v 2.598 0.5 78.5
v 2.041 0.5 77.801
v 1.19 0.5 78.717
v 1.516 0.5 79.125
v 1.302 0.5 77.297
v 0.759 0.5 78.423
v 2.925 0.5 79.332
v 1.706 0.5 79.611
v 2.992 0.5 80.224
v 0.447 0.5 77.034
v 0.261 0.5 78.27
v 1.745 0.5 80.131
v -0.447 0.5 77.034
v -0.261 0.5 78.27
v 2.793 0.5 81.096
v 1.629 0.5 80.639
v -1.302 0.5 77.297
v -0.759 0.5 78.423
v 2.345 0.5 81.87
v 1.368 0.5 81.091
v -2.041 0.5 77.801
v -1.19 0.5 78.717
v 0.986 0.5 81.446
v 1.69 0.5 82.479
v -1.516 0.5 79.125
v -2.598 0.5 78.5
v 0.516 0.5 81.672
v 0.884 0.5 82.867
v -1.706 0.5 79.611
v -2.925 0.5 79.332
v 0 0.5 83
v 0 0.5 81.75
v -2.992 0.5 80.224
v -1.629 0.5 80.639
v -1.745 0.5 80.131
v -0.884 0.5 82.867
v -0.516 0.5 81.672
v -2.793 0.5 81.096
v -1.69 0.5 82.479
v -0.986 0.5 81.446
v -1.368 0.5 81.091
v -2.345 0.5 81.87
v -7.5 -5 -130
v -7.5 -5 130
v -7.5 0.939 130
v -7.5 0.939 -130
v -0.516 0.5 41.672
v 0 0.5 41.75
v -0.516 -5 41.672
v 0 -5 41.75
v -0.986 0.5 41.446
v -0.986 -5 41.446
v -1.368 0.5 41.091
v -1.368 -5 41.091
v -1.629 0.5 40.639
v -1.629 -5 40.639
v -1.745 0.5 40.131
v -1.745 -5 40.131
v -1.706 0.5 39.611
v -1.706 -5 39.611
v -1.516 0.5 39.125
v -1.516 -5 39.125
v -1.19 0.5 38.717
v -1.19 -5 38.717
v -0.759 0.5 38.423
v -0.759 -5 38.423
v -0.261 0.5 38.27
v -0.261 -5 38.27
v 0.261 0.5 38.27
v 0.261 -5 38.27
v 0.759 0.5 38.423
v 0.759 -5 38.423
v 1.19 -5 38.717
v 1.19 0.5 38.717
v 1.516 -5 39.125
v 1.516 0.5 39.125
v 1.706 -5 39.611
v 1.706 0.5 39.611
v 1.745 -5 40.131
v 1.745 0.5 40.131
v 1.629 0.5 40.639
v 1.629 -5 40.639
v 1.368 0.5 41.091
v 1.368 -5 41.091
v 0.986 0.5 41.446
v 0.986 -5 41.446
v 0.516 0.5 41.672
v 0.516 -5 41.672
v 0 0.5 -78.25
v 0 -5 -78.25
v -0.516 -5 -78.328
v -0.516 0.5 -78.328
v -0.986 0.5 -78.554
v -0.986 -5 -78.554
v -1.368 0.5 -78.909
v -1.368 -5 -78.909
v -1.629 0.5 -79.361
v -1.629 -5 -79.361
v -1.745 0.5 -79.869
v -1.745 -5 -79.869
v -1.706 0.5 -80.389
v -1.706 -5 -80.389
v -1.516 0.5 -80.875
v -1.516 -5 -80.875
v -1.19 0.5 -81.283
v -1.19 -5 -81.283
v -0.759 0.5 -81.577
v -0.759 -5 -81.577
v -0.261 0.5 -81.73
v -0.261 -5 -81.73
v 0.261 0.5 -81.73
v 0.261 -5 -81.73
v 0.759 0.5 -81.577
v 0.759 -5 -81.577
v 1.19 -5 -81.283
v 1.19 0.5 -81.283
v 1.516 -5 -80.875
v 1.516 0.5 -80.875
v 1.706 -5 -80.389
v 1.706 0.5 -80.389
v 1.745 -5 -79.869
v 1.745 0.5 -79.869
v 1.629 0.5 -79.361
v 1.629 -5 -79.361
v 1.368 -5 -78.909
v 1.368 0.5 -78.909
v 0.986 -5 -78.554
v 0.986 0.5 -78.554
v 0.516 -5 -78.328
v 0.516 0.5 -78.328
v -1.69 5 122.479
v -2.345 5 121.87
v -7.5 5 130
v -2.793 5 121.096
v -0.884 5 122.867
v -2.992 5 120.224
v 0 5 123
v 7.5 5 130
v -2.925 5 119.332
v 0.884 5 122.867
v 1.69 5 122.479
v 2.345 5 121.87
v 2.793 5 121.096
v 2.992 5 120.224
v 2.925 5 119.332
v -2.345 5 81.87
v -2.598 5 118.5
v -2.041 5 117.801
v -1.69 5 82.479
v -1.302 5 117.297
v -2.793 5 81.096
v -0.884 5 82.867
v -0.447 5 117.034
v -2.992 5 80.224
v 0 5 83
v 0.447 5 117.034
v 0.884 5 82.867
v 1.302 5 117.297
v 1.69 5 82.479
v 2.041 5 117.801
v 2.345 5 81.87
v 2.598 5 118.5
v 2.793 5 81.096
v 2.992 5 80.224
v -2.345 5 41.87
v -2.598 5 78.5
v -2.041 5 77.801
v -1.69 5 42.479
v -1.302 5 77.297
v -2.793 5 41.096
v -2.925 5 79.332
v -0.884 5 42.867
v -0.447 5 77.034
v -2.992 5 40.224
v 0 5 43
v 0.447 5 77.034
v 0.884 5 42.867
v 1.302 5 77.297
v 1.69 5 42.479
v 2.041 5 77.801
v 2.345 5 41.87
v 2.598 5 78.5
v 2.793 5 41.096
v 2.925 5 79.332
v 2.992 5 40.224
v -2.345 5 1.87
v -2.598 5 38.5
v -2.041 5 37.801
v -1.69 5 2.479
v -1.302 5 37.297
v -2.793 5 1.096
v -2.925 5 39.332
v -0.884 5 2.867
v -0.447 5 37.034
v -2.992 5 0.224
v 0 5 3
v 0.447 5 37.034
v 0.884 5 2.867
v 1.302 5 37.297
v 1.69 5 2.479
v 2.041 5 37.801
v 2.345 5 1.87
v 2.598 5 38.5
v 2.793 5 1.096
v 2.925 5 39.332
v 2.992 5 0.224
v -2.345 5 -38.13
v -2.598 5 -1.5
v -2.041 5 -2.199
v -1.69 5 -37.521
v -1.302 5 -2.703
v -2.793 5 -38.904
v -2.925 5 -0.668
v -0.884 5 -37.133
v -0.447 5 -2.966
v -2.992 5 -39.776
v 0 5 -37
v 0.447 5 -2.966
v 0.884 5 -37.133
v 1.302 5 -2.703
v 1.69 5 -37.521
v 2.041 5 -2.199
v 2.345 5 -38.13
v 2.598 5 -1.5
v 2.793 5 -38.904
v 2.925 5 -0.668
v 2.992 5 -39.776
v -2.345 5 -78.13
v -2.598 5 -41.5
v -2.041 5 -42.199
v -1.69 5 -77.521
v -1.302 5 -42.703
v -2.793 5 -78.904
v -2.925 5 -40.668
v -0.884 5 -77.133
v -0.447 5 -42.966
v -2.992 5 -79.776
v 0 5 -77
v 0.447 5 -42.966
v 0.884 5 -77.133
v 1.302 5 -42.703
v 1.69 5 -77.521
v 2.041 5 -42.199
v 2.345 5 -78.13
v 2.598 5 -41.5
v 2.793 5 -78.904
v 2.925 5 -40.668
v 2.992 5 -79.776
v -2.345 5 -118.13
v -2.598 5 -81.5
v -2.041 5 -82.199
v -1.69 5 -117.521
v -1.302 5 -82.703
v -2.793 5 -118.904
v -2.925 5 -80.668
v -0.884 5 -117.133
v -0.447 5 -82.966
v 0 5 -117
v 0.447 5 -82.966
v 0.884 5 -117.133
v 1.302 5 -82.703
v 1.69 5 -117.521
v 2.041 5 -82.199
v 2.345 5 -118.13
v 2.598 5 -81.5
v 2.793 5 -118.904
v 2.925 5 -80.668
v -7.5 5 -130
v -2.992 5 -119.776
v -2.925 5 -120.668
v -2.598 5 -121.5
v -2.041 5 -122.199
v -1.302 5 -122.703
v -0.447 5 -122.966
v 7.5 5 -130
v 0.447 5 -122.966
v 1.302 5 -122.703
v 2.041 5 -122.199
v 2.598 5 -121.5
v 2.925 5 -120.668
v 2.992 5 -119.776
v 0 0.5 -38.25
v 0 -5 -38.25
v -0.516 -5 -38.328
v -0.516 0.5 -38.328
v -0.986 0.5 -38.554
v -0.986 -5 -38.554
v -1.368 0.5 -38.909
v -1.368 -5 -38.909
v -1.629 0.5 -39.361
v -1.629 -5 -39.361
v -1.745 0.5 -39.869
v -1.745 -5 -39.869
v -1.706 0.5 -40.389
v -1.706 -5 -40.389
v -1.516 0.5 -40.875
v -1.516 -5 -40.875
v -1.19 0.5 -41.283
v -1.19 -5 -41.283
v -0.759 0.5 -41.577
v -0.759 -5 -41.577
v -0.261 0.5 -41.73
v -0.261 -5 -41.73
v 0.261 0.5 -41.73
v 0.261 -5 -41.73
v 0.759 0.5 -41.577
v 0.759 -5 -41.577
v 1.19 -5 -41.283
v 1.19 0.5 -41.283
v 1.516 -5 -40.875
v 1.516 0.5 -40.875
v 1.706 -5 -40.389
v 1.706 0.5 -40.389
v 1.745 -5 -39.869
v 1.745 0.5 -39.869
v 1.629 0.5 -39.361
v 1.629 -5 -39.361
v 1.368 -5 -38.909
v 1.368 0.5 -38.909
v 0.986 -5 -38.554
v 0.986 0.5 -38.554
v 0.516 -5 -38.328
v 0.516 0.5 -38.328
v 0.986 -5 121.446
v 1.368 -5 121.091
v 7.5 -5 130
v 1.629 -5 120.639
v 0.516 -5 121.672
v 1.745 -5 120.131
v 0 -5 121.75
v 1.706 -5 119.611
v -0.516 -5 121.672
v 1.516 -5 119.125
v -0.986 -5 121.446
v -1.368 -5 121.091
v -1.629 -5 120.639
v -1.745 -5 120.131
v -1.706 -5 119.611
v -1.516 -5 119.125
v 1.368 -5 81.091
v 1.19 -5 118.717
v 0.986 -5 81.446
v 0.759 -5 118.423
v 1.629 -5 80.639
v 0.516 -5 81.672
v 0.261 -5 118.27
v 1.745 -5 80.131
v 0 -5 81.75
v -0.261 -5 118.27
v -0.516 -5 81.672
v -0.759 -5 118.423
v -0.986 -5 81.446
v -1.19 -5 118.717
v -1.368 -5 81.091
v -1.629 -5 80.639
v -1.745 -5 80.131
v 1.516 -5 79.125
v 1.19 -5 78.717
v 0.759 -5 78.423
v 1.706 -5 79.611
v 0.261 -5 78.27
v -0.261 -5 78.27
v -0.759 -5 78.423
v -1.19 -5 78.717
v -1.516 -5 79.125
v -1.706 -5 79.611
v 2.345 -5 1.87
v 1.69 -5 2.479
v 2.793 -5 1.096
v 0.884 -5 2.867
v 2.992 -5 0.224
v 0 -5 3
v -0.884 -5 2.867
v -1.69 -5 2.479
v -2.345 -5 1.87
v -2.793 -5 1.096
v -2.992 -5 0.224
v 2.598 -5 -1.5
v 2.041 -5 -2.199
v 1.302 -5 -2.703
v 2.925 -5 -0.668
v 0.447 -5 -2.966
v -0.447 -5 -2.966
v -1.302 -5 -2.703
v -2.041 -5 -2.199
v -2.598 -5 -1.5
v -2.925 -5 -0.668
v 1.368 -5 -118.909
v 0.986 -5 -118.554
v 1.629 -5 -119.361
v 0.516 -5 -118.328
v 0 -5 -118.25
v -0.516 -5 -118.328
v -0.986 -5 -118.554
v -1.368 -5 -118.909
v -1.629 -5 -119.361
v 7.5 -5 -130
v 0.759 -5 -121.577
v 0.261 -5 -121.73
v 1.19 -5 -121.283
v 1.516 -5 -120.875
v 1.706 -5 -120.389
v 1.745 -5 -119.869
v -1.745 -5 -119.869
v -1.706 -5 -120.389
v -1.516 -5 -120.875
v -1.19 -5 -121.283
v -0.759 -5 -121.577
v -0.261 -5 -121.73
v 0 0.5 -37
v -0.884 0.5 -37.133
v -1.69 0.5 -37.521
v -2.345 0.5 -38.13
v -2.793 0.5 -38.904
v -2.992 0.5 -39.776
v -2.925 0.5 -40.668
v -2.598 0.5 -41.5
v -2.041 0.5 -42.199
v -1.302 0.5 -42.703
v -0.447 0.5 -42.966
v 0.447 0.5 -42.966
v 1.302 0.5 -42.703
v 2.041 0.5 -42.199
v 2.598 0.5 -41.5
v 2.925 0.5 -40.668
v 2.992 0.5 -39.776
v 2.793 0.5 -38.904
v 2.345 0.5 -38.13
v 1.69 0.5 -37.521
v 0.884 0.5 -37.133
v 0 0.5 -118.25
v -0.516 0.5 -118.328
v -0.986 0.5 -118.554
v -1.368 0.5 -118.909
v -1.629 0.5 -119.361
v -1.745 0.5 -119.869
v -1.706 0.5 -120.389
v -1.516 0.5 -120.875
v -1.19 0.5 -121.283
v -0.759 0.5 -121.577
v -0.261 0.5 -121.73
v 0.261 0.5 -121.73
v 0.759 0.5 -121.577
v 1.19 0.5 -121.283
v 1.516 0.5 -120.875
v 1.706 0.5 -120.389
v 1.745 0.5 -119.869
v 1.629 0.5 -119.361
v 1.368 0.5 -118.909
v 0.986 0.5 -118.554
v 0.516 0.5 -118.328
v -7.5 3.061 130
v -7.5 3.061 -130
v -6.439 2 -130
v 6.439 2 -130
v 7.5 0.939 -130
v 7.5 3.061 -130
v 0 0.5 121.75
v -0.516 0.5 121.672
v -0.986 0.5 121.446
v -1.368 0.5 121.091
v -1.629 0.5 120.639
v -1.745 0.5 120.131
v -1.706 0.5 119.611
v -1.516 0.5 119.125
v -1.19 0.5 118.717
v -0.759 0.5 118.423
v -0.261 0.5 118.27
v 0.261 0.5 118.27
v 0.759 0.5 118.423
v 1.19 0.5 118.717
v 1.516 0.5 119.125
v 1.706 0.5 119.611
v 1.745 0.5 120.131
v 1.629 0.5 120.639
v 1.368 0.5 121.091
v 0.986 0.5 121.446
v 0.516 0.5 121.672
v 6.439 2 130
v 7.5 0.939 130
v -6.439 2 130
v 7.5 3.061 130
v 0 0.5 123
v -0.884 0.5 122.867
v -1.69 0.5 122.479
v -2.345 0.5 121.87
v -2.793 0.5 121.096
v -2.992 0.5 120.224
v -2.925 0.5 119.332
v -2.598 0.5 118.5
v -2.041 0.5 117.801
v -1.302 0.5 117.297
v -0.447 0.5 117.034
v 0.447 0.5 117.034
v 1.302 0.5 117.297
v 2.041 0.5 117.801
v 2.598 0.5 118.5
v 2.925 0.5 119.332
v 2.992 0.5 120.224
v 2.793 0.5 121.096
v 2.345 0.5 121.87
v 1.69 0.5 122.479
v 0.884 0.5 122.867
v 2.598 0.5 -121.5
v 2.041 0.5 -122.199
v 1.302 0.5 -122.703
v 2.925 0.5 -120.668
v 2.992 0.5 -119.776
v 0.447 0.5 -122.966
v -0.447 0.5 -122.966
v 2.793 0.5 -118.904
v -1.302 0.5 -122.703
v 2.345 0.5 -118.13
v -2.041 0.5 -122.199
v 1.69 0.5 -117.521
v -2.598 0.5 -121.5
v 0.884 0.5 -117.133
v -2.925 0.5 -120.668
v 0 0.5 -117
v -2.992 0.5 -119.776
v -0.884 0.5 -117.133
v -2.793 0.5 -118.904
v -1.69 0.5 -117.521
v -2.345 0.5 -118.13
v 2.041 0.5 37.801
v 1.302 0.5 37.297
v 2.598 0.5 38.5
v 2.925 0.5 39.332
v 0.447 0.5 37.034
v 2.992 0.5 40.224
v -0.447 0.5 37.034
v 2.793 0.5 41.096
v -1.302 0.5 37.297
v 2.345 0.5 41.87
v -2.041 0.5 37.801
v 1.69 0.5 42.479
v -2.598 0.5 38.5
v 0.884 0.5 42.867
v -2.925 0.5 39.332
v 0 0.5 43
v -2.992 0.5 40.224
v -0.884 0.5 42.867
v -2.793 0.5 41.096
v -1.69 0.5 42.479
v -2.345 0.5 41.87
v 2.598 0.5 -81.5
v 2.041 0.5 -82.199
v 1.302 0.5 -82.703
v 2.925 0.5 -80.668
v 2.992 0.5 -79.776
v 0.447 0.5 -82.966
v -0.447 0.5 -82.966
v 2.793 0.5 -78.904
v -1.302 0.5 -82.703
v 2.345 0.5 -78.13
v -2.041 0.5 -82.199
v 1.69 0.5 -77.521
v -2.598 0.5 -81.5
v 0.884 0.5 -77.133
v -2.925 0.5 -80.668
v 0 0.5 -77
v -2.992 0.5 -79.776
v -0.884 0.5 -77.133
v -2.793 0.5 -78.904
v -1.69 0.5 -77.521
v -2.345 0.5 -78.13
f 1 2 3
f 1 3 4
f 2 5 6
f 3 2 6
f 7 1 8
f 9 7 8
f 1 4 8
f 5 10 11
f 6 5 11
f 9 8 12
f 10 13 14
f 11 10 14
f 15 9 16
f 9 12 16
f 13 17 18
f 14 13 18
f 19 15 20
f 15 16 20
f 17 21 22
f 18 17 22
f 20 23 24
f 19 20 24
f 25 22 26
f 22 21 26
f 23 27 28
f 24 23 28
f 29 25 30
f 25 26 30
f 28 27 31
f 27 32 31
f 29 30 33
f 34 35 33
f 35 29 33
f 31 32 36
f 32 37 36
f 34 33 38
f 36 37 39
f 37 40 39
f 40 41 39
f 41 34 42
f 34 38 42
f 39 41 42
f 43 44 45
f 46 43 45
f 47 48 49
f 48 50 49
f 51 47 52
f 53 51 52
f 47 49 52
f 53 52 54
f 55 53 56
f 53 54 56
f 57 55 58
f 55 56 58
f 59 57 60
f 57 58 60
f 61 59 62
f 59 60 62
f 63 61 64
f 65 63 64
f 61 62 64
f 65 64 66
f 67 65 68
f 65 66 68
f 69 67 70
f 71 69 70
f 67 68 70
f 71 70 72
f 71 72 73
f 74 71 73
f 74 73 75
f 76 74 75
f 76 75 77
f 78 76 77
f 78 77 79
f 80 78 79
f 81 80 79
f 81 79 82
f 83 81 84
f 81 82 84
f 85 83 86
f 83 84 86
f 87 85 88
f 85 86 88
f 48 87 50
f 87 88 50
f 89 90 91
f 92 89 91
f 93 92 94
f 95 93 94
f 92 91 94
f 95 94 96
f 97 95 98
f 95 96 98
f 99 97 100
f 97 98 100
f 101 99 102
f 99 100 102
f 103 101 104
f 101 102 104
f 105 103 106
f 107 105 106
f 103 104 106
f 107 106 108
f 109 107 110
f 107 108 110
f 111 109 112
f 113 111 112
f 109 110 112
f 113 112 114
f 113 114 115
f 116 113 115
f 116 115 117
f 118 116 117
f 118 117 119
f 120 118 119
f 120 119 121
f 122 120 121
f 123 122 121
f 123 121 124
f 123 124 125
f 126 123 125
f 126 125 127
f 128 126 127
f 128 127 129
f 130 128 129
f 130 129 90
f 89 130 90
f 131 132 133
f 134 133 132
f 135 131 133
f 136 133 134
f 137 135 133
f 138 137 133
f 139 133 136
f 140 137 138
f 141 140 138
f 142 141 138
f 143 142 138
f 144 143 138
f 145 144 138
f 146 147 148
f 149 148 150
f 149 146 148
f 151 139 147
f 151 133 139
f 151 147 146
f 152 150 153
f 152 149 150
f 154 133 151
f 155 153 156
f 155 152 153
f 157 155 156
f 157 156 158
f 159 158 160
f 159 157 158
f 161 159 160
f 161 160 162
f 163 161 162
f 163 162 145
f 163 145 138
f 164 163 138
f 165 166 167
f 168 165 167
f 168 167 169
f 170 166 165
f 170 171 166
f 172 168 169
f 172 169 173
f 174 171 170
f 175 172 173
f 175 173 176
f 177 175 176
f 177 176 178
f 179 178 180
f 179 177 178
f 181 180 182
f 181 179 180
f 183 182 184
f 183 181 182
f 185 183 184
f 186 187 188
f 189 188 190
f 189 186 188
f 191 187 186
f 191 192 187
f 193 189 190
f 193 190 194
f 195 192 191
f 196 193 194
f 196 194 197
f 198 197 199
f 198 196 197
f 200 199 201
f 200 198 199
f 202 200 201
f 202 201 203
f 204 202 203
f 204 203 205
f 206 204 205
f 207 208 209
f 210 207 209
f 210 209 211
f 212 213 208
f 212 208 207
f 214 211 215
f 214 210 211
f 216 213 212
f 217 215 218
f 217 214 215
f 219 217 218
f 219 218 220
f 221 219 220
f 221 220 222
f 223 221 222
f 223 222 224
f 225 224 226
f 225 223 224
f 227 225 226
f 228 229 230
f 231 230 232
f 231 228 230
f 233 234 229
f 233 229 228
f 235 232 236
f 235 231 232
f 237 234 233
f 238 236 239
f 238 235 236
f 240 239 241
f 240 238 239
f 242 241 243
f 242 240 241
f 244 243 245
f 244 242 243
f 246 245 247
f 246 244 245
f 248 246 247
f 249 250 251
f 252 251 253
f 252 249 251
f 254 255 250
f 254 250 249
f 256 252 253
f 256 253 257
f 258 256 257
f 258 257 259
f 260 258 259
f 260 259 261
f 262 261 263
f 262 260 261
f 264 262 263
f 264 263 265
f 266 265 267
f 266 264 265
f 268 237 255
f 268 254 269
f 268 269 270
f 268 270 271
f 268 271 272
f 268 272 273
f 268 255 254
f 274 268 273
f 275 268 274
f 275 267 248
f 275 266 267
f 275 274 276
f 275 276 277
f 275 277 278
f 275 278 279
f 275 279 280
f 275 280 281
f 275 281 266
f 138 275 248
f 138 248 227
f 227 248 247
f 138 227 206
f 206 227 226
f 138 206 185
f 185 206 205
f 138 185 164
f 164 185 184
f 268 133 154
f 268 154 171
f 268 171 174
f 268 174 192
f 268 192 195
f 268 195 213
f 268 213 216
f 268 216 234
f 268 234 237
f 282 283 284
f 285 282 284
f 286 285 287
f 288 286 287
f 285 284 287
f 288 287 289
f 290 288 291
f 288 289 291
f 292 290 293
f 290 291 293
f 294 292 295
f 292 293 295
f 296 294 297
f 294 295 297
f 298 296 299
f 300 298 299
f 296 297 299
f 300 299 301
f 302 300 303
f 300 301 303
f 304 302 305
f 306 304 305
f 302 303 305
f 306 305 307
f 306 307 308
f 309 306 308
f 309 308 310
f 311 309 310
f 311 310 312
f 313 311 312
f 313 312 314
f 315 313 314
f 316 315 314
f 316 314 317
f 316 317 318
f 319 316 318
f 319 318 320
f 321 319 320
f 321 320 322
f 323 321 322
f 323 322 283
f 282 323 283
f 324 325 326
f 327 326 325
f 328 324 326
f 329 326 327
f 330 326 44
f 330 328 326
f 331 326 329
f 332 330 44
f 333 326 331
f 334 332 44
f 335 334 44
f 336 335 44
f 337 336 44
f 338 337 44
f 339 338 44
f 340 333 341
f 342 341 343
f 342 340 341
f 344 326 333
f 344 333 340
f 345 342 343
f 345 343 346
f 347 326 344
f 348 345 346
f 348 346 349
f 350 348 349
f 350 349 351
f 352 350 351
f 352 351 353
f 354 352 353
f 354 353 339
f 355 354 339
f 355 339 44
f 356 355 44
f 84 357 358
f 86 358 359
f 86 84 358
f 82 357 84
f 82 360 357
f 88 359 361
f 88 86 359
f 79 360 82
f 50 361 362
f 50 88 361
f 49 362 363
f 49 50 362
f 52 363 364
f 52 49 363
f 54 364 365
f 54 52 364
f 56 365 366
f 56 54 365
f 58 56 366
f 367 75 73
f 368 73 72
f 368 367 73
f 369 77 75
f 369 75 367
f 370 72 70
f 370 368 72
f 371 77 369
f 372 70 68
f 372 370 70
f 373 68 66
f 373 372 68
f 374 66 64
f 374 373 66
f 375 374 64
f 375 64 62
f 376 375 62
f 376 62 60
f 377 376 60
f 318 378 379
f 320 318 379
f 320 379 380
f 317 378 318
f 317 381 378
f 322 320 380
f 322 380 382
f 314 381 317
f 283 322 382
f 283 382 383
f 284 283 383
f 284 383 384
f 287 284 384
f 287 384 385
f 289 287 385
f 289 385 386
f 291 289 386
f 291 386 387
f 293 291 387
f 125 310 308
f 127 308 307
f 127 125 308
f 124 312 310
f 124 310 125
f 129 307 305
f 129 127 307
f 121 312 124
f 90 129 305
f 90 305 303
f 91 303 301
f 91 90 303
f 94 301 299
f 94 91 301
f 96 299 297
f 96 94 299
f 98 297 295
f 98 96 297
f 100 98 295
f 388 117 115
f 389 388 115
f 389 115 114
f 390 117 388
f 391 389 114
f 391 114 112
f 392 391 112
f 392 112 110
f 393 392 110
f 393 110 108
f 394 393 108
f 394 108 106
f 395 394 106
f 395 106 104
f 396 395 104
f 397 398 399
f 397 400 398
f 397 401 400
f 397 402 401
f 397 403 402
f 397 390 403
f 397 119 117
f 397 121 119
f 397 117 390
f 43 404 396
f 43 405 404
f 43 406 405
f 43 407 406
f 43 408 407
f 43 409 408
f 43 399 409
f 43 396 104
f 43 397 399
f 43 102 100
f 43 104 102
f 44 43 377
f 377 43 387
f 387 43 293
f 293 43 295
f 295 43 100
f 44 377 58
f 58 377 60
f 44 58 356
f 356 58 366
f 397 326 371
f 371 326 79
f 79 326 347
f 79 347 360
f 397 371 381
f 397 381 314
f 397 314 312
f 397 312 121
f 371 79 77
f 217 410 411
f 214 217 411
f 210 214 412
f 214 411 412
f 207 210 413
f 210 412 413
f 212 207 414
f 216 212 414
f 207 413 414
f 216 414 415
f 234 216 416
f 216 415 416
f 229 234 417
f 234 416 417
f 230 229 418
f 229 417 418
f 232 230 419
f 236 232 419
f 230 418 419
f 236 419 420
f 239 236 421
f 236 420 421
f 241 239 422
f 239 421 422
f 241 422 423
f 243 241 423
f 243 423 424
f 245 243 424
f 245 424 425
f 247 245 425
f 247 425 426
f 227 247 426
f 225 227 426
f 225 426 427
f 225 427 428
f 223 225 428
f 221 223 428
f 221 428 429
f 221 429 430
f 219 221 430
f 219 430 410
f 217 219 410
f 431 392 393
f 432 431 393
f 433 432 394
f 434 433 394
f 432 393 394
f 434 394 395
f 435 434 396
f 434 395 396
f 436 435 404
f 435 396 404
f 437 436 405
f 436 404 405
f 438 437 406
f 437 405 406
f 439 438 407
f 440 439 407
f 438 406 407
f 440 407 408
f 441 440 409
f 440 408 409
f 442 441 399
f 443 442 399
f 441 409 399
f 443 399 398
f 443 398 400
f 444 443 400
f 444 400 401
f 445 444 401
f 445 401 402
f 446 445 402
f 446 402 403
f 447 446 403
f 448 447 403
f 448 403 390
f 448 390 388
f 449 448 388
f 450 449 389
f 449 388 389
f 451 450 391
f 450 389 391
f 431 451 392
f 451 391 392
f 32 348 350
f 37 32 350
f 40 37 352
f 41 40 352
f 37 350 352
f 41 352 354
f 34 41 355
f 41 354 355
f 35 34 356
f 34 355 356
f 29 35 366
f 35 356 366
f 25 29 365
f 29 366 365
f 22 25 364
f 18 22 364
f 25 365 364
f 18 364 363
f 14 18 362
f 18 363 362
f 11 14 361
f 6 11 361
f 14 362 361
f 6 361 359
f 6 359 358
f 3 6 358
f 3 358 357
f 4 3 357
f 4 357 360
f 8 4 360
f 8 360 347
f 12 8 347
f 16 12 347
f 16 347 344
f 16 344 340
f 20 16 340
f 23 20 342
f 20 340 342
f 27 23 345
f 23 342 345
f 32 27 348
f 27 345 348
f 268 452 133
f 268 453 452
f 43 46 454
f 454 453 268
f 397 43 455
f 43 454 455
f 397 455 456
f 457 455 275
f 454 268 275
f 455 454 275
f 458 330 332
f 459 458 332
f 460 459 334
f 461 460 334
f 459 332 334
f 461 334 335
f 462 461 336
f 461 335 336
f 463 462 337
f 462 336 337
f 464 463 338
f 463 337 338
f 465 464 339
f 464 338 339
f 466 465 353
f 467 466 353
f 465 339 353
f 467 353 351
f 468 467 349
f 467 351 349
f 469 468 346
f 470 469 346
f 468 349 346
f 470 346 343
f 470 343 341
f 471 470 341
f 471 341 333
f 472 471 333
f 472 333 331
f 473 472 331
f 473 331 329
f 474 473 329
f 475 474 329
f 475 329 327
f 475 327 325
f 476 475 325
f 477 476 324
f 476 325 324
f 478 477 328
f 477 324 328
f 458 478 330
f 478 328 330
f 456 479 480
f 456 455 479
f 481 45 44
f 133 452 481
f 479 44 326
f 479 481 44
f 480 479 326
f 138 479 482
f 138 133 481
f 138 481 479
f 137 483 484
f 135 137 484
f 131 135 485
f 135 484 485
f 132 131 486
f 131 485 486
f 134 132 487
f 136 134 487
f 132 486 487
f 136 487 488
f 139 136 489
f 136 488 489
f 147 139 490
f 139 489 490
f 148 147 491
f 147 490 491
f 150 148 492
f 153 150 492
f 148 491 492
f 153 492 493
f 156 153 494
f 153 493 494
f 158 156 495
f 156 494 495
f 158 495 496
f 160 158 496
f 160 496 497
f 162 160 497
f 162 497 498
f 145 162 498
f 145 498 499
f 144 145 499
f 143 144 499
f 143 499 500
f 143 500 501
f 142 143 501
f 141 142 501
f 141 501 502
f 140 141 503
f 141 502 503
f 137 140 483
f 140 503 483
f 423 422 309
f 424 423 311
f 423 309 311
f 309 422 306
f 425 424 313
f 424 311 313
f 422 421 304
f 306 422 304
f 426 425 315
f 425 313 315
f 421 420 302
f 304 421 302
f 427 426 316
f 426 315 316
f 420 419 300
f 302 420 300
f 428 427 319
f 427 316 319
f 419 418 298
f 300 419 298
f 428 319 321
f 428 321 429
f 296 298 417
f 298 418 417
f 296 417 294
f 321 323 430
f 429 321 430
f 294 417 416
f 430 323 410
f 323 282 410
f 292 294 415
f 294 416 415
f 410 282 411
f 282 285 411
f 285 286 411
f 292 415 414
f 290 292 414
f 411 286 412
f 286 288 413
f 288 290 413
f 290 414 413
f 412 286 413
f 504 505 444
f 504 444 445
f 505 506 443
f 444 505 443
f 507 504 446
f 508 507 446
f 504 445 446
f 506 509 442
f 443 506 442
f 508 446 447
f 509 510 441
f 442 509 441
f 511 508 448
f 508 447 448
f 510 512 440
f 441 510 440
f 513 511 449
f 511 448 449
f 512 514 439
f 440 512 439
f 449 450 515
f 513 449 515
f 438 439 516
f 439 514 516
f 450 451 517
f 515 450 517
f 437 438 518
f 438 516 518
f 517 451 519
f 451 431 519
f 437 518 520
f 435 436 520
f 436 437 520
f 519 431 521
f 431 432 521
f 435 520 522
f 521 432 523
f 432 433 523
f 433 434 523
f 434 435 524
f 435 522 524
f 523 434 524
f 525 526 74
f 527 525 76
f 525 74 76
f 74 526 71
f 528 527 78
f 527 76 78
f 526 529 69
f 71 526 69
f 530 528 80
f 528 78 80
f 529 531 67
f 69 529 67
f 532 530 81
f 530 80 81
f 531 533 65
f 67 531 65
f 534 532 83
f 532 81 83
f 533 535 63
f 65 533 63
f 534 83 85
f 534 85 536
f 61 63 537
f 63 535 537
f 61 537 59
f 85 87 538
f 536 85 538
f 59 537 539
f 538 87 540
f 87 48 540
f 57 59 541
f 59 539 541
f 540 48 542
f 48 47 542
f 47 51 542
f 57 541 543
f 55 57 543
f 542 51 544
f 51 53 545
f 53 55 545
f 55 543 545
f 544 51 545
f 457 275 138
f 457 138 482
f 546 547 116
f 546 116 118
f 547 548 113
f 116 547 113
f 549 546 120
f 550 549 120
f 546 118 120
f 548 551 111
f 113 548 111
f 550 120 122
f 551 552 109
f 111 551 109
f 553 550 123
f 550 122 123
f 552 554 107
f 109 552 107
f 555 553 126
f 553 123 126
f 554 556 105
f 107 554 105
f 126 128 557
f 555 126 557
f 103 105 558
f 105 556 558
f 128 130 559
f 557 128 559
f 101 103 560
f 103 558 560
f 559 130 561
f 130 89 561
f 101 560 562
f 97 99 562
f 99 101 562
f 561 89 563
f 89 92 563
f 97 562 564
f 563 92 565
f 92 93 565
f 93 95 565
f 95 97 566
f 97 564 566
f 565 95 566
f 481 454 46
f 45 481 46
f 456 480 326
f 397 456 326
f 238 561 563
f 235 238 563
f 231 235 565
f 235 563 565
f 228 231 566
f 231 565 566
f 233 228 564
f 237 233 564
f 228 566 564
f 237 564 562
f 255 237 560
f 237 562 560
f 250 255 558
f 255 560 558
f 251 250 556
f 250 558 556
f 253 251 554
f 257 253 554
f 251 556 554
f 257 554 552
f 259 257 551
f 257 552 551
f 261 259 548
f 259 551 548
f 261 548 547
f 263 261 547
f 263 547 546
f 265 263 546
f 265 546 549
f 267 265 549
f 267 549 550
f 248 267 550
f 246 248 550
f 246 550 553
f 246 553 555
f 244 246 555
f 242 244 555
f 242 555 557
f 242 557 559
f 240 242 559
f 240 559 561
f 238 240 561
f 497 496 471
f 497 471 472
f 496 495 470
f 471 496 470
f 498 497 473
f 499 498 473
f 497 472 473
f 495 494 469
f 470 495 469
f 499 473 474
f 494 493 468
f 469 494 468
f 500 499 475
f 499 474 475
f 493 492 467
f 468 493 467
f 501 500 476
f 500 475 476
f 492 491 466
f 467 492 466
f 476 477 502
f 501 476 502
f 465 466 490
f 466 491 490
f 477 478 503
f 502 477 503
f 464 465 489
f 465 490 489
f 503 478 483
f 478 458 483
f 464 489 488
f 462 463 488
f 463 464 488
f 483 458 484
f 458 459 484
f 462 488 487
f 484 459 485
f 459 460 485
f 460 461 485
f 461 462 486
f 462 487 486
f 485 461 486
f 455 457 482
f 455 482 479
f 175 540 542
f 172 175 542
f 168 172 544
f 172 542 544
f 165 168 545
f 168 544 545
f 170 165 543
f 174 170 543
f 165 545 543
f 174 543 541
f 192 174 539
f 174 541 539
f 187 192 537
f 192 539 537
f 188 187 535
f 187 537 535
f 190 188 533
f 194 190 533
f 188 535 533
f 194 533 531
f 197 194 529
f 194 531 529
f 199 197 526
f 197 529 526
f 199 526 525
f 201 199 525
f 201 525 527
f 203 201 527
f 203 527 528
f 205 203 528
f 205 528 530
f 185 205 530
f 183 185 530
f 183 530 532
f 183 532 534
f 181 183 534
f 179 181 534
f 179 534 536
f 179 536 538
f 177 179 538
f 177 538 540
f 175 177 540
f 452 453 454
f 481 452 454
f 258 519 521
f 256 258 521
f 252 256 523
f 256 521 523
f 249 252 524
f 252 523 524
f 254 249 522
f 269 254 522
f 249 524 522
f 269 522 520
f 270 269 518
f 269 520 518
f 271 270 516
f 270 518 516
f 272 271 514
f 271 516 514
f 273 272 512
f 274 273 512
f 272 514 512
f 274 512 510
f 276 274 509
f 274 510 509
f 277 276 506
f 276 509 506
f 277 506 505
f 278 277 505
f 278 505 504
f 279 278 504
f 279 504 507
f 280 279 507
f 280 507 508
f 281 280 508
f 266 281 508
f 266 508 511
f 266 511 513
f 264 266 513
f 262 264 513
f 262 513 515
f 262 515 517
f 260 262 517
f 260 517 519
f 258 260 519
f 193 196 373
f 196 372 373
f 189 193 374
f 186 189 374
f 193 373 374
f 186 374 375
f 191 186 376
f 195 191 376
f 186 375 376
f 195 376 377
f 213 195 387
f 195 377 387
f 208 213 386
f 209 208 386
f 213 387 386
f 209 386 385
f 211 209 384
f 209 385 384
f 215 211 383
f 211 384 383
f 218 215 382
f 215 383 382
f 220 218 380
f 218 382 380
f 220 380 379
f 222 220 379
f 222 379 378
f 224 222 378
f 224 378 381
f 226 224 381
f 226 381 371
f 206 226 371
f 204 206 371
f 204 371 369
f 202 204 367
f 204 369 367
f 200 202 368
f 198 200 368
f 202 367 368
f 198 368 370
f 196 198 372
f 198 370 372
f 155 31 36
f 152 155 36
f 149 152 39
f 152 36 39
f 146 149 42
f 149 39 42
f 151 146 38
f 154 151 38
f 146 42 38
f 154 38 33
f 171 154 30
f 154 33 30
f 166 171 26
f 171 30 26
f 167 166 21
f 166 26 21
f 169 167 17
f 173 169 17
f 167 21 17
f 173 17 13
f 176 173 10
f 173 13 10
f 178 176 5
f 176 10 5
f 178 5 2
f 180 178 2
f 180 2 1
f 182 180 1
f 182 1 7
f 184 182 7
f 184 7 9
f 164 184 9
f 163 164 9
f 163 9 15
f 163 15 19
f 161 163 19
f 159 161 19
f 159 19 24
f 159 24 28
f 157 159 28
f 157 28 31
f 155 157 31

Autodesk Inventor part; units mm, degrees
ref_plane "YZ Plane" through (0, 0, 0) normal (1, 0, 0) x (0, 1, 0)
ref_plane "XZ Plane" through (0, 0, 0) normal (0, 1, 0) x (-1, 0, 0)
ref_plane "XY Plane" through (0, 0, 0) normal (0, 0, 1) x (1, 0, 0)
sketch "Sketch1" plane through (0, 0, 0) normal (0, 0, 1) x (1, 0, 0)
  line L0 (-7.5, 5) -> (7.5, 5)
  line L1 (7.5, 5) -> (7.5, -5)
  line L2 (7.5, -5) -> (-7.5, -5)
  line L3 (-7.5, -5) -> (-7.5, 5)
  line L4 (-7.5, 5) -> (7.5, -5) construction
  line L5 (7.5, 5) -> (-7.5, -5) construction
  line L6 (-7.5, 3.0607) -> (-6.4393, 2)
  line L7 (-7.5, 3.0607) -> (-6, 3.0607) construction
  line L8 (-6.4393, 2) -> (-7.5, 0.9393)
  line L9 (0, 5) -> (0, -5) construction
  line L10 (7.5, 3.0607) -> (6.4393, 2)
  line L11 (6.4393, 2) -> (7.5, 0.9393)
  point P0 (0, 0)
  point P1 (7.5, 0.9393)
  point P2 (7.5, 3.0607)
  dimension "d0" = 15
  dimension "d1" = 10
  dimension "d2" = 45
  dimension "d3" = 3
  dimension "d4" = 1.5
extrude "Extrusion1" add sketch "Sketch1" along normal mid plane 260 contours L0 L1 L10 L11 L2 L3 L8 L6
sketch "Sketch2" plane through (-7.5, 5, 130) normal (0, 1, 0) x (1, 0, 0)
  point P0 (7.5, 130)
  point P1 (7.5, 130)
hole "Hole1" at (0, 5, 0) direction (0, -1, 0) diameter 3.5 end through all counterbore diameter 6 counterbore depth 4.5
pattern_linear "Rectangular Pattern1" count 9 spacing 40 along (0, 0, 1) of "Hole1" first direction both ways yes
sketch "Sketch3" plane through (-7.5, 5, 130) normal (0, 1, 0) x (1, 0, 0)
  point P0 (7.5, 130)
  point P1 (7.5, 130)
hole "Hole2" at (0, 5, 0) direction (0, -1, 0) diameter 6 end through all
properties part number "MGN15 Rail" material "Stainless Steel, 440C"
